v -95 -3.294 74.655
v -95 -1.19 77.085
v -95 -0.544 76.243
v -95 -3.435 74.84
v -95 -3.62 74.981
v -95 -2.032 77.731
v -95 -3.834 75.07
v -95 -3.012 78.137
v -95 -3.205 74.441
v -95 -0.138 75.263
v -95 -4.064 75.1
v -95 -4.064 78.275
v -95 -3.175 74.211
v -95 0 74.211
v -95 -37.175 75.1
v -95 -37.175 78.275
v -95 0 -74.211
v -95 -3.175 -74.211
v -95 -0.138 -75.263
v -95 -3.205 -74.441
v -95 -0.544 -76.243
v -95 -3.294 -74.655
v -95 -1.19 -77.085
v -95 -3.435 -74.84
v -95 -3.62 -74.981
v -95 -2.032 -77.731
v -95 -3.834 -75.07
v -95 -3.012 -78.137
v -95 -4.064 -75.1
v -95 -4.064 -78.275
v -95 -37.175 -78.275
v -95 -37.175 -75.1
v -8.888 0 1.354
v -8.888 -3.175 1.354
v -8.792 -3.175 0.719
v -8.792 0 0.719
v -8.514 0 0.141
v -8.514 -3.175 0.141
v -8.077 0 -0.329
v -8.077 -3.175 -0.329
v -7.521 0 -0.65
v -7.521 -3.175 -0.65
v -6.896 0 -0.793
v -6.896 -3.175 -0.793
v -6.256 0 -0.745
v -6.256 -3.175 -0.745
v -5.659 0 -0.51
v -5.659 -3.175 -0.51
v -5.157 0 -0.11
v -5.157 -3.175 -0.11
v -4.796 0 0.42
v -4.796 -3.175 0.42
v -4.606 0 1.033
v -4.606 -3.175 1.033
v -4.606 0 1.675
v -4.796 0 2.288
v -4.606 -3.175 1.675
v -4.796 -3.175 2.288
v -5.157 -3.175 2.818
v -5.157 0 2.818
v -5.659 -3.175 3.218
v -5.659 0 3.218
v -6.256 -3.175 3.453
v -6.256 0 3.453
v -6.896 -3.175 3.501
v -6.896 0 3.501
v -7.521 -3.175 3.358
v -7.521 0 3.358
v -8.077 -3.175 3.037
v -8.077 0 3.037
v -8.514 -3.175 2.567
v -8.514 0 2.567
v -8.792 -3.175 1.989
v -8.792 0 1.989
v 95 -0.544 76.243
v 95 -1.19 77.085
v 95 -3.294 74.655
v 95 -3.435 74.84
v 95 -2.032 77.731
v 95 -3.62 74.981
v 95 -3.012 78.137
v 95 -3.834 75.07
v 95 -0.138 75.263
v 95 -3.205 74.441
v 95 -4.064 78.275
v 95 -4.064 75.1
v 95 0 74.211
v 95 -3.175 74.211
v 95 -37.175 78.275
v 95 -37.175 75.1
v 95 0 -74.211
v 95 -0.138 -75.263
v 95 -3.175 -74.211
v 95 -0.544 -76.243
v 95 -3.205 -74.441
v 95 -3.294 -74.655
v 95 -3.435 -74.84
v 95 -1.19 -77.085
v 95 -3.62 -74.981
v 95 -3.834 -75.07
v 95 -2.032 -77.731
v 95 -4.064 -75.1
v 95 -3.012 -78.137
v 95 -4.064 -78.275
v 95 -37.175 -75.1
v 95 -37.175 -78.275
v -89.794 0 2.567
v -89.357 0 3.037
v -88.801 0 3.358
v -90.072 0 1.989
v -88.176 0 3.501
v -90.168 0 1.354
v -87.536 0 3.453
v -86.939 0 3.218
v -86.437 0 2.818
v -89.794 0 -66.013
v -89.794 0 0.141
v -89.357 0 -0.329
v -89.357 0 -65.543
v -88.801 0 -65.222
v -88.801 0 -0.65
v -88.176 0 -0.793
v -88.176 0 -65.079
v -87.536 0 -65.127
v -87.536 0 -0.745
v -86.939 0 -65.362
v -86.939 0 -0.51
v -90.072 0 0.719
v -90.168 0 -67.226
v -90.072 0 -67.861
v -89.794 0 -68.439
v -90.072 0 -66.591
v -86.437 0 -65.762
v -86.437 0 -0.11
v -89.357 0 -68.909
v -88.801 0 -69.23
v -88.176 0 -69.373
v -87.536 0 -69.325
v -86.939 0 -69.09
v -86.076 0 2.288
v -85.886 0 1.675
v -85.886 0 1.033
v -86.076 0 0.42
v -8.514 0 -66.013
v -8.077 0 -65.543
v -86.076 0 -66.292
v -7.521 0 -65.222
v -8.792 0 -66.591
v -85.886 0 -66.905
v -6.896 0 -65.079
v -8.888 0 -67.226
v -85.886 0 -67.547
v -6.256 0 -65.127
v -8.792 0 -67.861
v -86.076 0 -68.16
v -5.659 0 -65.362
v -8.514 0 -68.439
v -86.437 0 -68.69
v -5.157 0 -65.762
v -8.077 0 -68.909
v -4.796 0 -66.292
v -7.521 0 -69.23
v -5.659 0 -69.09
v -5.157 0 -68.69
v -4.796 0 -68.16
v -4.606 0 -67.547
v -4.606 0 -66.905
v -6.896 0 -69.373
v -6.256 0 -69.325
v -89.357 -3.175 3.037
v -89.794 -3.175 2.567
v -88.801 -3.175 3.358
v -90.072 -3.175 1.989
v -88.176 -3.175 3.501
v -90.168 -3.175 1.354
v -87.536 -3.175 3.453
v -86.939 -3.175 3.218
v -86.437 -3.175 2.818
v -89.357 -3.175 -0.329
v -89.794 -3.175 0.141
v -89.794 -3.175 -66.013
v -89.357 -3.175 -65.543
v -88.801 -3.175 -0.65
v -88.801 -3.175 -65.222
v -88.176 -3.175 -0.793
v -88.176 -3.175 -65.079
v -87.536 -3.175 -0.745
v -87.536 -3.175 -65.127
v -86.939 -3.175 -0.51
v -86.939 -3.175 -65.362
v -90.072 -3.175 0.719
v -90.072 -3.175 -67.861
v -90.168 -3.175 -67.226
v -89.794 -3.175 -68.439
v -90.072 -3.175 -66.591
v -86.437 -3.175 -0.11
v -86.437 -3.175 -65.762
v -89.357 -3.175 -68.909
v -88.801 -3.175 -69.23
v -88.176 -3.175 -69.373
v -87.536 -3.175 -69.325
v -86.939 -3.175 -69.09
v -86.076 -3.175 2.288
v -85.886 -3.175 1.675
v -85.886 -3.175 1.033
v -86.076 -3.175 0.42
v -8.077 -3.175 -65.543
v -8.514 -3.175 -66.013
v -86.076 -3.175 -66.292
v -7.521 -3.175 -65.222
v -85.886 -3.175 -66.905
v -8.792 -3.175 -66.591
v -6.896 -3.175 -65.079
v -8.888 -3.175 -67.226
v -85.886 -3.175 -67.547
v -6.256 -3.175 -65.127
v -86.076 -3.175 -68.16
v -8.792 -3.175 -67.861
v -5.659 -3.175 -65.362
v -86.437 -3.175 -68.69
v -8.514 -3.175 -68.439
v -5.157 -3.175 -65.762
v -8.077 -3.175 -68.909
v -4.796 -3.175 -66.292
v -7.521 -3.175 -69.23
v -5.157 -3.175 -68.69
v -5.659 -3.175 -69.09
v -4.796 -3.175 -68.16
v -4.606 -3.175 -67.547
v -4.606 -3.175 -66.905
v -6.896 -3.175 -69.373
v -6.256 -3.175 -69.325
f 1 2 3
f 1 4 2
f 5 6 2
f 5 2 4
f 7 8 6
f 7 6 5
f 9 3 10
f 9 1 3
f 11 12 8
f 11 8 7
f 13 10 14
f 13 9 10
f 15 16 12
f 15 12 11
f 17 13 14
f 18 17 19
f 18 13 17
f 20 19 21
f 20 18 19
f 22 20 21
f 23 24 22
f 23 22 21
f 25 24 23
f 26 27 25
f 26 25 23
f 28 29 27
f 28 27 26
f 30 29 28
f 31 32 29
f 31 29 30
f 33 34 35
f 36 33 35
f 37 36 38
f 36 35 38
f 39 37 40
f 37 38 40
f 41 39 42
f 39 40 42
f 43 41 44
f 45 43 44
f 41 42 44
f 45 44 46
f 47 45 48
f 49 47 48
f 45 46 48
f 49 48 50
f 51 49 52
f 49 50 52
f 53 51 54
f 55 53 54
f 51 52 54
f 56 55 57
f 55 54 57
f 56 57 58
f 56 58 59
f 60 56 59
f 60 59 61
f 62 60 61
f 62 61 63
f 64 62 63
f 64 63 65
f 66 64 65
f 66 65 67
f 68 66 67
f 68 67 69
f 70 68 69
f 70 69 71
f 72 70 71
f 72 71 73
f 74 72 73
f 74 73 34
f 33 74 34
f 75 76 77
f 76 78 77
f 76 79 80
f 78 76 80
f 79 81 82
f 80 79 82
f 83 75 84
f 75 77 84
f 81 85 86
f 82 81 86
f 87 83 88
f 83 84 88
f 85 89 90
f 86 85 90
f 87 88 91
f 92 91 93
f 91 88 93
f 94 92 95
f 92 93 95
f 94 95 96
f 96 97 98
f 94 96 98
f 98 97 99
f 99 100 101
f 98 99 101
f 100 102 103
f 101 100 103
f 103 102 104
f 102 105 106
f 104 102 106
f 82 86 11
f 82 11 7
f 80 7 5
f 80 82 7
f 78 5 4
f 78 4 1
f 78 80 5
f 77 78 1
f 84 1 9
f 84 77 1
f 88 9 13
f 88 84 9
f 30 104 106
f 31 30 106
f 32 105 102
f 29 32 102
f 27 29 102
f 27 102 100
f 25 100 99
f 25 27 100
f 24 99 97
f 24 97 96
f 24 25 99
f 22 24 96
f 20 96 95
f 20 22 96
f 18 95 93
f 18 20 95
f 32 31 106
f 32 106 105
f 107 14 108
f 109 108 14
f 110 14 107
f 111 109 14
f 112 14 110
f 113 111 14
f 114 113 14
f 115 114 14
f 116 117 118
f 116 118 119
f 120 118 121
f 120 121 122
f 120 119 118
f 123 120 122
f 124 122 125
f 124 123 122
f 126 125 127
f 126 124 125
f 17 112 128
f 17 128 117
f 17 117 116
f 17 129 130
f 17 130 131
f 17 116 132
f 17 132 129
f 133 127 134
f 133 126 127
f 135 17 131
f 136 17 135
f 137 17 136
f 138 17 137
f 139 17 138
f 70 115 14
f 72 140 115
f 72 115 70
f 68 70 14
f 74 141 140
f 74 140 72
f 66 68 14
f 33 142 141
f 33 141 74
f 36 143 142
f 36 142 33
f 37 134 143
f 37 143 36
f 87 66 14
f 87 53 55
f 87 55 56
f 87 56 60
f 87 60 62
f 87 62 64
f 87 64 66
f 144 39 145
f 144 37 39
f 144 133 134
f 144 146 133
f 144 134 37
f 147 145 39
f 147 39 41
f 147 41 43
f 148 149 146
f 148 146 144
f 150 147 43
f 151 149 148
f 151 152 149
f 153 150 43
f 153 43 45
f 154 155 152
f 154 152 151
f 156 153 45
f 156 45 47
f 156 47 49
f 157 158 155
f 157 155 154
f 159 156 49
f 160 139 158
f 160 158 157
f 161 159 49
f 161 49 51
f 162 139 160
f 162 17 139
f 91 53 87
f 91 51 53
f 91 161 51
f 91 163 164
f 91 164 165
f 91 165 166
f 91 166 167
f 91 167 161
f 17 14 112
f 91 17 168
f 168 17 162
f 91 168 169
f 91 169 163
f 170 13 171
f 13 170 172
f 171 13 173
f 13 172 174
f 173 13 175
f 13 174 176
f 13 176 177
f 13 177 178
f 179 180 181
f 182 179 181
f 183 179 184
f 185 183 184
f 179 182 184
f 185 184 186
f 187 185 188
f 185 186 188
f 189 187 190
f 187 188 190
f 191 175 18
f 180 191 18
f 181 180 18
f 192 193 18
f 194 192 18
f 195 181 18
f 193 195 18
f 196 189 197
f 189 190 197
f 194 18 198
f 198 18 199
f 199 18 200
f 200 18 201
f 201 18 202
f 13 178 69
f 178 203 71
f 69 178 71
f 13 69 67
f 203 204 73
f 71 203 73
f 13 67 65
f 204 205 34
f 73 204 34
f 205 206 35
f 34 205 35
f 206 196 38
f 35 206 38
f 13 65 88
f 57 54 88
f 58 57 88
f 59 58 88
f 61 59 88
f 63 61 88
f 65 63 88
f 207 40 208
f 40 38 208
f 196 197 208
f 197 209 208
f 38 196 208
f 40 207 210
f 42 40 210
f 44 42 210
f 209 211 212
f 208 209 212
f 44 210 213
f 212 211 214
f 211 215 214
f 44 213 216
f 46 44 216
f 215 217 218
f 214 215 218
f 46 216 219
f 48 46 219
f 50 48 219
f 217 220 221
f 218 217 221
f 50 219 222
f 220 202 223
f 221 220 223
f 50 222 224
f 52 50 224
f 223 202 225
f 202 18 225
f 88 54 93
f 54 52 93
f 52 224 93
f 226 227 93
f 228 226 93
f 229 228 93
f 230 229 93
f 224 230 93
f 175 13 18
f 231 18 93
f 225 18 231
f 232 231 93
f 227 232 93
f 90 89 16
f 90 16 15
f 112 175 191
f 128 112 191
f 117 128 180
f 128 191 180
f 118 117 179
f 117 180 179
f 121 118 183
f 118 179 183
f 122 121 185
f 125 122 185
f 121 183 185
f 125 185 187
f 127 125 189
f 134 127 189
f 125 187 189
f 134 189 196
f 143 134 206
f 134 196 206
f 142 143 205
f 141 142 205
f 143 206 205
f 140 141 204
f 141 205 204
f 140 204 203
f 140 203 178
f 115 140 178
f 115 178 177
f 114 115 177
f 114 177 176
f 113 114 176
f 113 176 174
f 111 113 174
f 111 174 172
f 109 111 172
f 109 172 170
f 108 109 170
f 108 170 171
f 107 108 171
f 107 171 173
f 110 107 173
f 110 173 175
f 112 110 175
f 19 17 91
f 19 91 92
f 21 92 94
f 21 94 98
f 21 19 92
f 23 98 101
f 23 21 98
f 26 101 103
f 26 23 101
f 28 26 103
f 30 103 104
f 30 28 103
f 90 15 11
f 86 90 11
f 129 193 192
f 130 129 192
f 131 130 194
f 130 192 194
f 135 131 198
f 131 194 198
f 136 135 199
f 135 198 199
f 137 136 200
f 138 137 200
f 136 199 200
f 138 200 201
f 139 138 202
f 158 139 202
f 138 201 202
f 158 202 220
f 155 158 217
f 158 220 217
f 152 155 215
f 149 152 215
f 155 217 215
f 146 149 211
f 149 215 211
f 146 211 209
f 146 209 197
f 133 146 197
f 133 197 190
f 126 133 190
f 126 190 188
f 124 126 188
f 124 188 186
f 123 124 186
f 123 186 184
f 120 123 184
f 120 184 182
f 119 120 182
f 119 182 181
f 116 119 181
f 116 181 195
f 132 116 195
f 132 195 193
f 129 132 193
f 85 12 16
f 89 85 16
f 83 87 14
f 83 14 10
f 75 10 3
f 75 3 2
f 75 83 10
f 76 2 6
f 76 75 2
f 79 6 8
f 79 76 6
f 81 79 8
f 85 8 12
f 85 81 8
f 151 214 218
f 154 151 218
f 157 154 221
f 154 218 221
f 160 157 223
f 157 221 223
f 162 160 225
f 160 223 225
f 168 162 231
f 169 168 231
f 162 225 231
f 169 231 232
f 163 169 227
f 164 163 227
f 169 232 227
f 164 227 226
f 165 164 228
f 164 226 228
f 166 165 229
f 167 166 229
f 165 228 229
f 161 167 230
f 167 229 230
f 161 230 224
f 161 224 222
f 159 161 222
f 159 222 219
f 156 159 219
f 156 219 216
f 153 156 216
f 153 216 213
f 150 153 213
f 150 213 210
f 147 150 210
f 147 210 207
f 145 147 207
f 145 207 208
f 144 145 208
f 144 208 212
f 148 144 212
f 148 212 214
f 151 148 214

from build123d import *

# Parameters (mm, degrees)
SKETCH2_W                      = 190
SKETCH2_H                      = 150
BASE_FLANGE1_DEPTH             = 3.175
EDGE_FLANGE1_STRIP_W           = 14.578
EDGE_FLANGE1_STRIP_H           = 3.175
EDGE_FLANGE1_STRIP_CUT_DEPTH   = 190
EDGE_FLANGE1_STRIP_2_W         = 14.578
EDGE_FLANGE1_STRIP_2_H         = 3.175
EDGE_FLANGE1_STRIP_CUT_2_DEPTH = 190
EDGE_FLANGE1_DEPTH             = 190
EDGE_FLANGE1_BEND_DEPTH        = 190
F_6_CLEARANCE_HOLE1_D          = 4.3053
F_6_CLEARANCE_HOLE1_DEPTH      = 17.23
F_6_CLEARANCE_HOLE1_TIP        = 1.293442612


# Sheet-metal steps are written as plain solids
with BuildPart() as part:
    # Sketch2 → Base-Flange1 (new body)
    with BuildSketch(Plane(origin=(0, 0, 0), x_dir=(1, 0, 0), z_dir=(0, 1, 0))):
        Rectangle(SKETCH2_W, SKETCH2_H)
    extrude(amount=-BASE_FLANGE1_DEPTH)

    # Edge-Flange1 strip (across the edge) → Edge-Flange1 strip cut (cut)
    with BuildSketch(Plane(origin=(95, -3.175, 75.1), x_dir=(0, 0, -1), z_dir=(-1, 0, 0))):
        with Locations((-6.4, -1.5875)):
            Rectangle(EDGE_FLANGE1_STRIP_W, EDGE_FLANGE1_STRIP_H)
    extrude(amount=EDGE_FLANGE1_STRIP_CUT_DEPTH, mode=Mode.SUBTRACT)

    # Edge-Flange1 strip 2 (across the edge) → Edge-Flange1 strip cut 2 (cut)
    with BuildSketch(Plane(origin=(-95, -3.175, -75.1), x_dir=(0, 0, 1), z_dir=(1, 0, 0))):
        with Locations((-6.4, -1.5875)):
            Rectangle(EDGE_FLANGE1_STRIP_2_W, EDGE_FLANGE1_STRIP_2_H)
    extrude(amount=EDGE_FLANGE1_STRIP_CUT_2_DEPTH, mode=Mode.SUBTRACT)

    # Edge-Flange1 section (across the edge) → Edge-Flange1 (add)
    with BuildSketch(Plane(origin=(95, -3.175, 75.1), x_dir=(0, 0, -1), z_dir=(-1, 0, 0))):
        with BuildLine():
            Line((-3.175, 0.889), (-3.175, 34))
            Line((-3.175, 34), (0, 34))
            Line((0, 34), (0, 0.889))
            ThreePointArc((0, 0.889), (0.260382072, 0.260382072), (0.889, 0))
            Line((0.889, 0), (0.889, -3.175))
            ThreePointArc((0.889, -3.175), (-1.984681959, -1.984681959), (-3.175, 0.889))
        make_face()
    extrude(amount=EDGE_FLANGE1_DEPTH)

    # Edge-Flange1 section 2 (across the edge) → Edge-Flange1 bend (add)
    with BuildSketch(Plane(origin=(-95, -3.175, -75.1), x_dir=(0, 0, 1), z_dir=(1, 0, 0))):
        with BuildLine():
            Line((-3.175, 0.889), (-3.175, 34))
            Line((-3.175, 34), (0, 34))
            Line((0, 34), (0, 0.889))
            ThreePointArc((0, 0.889), (0.260382072, 0.260382072), (0.889, 0))
            Line((0.889, 0), (0.889, -3.175))
            ThreePointArc((0.889, -3.175), (-1.984681959, -1.984681959), (-3.175, 0.889))
        make_face()
    extrude(amount=EDGE_FLANGE1_BEND_DEPTH)

    # #6 Clearance Hole1
    with Locations(Plane(origin=(0, 0, 0), x_dir=(1, 0, 0), z_dir=(0, 1, 0))):
        with Locations((-88.015, 67.226), (-6.735, 67.226), (-6.735, -1.354), (-88.015, -1.354)):
            Hole(F_6_CLEARANCE_HOLE1_D / 2, depth=F_6_CLEARANCE_HOLE1_DEPTH)
            with Locations((0, 0, -(F_6_CLEARANCE_HOLE1_DEPTH + F_6_CLEARANCE_HOLE1_TIP / 2))):  # 118° drill point
                Cone(0, F_6_CLEARANCE_HOLE1_D / 2, F_6_CLEARANCE_HOLE1_TIP, mode=Mode.SUBTRACT)


solid = part.part
